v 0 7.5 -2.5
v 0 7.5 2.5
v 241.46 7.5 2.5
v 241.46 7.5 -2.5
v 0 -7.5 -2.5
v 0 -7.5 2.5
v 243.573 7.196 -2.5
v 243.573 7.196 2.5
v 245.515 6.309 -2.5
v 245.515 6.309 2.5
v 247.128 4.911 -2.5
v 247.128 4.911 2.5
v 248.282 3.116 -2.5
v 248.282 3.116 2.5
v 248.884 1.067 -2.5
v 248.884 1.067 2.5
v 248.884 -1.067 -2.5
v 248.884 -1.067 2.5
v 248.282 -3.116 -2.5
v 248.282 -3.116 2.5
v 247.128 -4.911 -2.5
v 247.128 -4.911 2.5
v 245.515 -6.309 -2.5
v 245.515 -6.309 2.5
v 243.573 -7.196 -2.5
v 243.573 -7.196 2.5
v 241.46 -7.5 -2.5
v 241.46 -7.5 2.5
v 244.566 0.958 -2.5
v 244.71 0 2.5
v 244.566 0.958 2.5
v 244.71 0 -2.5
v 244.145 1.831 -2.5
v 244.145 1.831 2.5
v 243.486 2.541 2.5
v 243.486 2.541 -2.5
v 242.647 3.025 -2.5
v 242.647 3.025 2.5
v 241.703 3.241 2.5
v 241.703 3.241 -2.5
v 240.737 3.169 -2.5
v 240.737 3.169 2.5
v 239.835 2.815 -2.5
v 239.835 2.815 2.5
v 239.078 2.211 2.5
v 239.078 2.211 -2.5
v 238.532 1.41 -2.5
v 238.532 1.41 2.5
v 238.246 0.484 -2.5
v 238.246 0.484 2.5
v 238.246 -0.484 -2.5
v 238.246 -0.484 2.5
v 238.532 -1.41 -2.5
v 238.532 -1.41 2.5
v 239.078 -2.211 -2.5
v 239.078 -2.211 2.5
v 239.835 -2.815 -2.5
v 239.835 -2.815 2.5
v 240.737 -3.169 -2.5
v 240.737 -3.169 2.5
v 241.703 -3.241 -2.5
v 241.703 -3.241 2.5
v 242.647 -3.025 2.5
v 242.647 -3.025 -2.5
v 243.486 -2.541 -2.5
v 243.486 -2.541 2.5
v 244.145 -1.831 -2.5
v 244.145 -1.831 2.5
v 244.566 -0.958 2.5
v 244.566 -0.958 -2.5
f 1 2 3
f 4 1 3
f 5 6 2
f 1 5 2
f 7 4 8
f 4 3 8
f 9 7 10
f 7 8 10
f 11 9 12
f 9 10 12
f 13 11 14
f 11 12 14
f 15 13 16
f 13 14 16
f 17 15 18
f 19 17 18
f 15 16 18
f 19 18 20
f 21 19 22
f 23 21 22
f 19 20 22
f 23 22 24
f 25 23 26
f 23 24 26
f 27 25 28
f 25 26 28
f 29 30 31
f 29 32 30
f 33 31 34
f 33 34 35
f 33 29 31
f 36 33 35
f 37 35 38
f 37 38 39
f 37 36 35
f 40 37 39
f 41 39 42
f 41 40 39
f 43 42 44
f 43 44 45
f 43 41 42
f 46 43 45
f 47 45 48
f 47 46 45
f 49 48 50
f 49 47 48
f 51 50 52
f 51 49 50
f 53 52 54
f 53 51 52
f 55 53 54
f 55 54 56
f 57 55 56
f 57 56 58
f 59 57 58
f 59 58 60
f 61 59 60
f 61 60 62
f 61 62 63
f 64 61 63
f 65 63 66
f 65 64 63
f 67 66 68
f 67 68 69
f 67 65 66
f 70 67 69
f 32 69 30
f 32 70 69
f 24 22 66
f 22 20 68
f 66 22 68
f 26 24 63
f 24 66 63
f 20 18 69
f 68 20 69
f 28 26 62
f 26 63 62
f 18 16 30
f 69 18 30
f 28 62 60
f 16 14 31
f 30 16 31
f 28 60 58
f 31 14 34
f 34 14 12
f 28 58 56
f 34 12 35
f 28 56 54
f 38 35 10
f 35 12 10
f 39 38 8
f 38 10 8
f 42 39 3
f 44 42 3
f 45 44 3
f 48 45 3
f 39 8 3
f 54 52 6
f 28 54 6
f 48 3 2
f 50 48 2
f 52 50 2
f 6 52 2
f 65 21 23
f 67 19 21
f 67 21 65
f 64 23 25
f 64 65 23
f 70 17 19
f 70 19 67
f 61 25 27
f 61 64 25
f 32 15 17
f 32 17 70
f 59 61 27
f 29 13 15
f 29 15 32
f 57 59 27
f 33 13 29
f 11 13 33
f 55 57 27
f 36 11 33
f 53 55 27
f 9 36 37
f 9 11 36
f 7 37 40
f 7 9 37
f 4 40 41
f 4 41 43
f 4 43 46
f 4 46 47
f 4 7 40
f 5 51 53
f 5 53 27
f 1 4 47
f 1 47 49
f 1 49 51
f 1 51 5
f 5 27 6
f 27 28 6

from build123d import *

# Parameters (mm, degrees)
SKETCH1_R           = 3.25
BOSS_EXTRUDE1_DEPTH = 2.5


with BuildPart() as part:
    # Sketch1 → Boss-Extrude1 (new, symmetric)
    with BuildSketch(Plane.XY):
        with BuildLine():
            Line((0, 7.5), (241.46, 7.5))
            ThreePointArc((241.46, 7.5), (248.96, 0), (241.46, -7.5))
            Line((241.46, -7.5), (0, -7.5))
            Line((0, -7.5), (0, 7.5))
        make_face()
        with Locations((241.46, 0)):
            Circle(SKETCH1_R, mode=Mode.SUBTRACT)
    extrude(amount=BOSS_EXTRUDE1_DEPTH, both=True)


solid = part.part
